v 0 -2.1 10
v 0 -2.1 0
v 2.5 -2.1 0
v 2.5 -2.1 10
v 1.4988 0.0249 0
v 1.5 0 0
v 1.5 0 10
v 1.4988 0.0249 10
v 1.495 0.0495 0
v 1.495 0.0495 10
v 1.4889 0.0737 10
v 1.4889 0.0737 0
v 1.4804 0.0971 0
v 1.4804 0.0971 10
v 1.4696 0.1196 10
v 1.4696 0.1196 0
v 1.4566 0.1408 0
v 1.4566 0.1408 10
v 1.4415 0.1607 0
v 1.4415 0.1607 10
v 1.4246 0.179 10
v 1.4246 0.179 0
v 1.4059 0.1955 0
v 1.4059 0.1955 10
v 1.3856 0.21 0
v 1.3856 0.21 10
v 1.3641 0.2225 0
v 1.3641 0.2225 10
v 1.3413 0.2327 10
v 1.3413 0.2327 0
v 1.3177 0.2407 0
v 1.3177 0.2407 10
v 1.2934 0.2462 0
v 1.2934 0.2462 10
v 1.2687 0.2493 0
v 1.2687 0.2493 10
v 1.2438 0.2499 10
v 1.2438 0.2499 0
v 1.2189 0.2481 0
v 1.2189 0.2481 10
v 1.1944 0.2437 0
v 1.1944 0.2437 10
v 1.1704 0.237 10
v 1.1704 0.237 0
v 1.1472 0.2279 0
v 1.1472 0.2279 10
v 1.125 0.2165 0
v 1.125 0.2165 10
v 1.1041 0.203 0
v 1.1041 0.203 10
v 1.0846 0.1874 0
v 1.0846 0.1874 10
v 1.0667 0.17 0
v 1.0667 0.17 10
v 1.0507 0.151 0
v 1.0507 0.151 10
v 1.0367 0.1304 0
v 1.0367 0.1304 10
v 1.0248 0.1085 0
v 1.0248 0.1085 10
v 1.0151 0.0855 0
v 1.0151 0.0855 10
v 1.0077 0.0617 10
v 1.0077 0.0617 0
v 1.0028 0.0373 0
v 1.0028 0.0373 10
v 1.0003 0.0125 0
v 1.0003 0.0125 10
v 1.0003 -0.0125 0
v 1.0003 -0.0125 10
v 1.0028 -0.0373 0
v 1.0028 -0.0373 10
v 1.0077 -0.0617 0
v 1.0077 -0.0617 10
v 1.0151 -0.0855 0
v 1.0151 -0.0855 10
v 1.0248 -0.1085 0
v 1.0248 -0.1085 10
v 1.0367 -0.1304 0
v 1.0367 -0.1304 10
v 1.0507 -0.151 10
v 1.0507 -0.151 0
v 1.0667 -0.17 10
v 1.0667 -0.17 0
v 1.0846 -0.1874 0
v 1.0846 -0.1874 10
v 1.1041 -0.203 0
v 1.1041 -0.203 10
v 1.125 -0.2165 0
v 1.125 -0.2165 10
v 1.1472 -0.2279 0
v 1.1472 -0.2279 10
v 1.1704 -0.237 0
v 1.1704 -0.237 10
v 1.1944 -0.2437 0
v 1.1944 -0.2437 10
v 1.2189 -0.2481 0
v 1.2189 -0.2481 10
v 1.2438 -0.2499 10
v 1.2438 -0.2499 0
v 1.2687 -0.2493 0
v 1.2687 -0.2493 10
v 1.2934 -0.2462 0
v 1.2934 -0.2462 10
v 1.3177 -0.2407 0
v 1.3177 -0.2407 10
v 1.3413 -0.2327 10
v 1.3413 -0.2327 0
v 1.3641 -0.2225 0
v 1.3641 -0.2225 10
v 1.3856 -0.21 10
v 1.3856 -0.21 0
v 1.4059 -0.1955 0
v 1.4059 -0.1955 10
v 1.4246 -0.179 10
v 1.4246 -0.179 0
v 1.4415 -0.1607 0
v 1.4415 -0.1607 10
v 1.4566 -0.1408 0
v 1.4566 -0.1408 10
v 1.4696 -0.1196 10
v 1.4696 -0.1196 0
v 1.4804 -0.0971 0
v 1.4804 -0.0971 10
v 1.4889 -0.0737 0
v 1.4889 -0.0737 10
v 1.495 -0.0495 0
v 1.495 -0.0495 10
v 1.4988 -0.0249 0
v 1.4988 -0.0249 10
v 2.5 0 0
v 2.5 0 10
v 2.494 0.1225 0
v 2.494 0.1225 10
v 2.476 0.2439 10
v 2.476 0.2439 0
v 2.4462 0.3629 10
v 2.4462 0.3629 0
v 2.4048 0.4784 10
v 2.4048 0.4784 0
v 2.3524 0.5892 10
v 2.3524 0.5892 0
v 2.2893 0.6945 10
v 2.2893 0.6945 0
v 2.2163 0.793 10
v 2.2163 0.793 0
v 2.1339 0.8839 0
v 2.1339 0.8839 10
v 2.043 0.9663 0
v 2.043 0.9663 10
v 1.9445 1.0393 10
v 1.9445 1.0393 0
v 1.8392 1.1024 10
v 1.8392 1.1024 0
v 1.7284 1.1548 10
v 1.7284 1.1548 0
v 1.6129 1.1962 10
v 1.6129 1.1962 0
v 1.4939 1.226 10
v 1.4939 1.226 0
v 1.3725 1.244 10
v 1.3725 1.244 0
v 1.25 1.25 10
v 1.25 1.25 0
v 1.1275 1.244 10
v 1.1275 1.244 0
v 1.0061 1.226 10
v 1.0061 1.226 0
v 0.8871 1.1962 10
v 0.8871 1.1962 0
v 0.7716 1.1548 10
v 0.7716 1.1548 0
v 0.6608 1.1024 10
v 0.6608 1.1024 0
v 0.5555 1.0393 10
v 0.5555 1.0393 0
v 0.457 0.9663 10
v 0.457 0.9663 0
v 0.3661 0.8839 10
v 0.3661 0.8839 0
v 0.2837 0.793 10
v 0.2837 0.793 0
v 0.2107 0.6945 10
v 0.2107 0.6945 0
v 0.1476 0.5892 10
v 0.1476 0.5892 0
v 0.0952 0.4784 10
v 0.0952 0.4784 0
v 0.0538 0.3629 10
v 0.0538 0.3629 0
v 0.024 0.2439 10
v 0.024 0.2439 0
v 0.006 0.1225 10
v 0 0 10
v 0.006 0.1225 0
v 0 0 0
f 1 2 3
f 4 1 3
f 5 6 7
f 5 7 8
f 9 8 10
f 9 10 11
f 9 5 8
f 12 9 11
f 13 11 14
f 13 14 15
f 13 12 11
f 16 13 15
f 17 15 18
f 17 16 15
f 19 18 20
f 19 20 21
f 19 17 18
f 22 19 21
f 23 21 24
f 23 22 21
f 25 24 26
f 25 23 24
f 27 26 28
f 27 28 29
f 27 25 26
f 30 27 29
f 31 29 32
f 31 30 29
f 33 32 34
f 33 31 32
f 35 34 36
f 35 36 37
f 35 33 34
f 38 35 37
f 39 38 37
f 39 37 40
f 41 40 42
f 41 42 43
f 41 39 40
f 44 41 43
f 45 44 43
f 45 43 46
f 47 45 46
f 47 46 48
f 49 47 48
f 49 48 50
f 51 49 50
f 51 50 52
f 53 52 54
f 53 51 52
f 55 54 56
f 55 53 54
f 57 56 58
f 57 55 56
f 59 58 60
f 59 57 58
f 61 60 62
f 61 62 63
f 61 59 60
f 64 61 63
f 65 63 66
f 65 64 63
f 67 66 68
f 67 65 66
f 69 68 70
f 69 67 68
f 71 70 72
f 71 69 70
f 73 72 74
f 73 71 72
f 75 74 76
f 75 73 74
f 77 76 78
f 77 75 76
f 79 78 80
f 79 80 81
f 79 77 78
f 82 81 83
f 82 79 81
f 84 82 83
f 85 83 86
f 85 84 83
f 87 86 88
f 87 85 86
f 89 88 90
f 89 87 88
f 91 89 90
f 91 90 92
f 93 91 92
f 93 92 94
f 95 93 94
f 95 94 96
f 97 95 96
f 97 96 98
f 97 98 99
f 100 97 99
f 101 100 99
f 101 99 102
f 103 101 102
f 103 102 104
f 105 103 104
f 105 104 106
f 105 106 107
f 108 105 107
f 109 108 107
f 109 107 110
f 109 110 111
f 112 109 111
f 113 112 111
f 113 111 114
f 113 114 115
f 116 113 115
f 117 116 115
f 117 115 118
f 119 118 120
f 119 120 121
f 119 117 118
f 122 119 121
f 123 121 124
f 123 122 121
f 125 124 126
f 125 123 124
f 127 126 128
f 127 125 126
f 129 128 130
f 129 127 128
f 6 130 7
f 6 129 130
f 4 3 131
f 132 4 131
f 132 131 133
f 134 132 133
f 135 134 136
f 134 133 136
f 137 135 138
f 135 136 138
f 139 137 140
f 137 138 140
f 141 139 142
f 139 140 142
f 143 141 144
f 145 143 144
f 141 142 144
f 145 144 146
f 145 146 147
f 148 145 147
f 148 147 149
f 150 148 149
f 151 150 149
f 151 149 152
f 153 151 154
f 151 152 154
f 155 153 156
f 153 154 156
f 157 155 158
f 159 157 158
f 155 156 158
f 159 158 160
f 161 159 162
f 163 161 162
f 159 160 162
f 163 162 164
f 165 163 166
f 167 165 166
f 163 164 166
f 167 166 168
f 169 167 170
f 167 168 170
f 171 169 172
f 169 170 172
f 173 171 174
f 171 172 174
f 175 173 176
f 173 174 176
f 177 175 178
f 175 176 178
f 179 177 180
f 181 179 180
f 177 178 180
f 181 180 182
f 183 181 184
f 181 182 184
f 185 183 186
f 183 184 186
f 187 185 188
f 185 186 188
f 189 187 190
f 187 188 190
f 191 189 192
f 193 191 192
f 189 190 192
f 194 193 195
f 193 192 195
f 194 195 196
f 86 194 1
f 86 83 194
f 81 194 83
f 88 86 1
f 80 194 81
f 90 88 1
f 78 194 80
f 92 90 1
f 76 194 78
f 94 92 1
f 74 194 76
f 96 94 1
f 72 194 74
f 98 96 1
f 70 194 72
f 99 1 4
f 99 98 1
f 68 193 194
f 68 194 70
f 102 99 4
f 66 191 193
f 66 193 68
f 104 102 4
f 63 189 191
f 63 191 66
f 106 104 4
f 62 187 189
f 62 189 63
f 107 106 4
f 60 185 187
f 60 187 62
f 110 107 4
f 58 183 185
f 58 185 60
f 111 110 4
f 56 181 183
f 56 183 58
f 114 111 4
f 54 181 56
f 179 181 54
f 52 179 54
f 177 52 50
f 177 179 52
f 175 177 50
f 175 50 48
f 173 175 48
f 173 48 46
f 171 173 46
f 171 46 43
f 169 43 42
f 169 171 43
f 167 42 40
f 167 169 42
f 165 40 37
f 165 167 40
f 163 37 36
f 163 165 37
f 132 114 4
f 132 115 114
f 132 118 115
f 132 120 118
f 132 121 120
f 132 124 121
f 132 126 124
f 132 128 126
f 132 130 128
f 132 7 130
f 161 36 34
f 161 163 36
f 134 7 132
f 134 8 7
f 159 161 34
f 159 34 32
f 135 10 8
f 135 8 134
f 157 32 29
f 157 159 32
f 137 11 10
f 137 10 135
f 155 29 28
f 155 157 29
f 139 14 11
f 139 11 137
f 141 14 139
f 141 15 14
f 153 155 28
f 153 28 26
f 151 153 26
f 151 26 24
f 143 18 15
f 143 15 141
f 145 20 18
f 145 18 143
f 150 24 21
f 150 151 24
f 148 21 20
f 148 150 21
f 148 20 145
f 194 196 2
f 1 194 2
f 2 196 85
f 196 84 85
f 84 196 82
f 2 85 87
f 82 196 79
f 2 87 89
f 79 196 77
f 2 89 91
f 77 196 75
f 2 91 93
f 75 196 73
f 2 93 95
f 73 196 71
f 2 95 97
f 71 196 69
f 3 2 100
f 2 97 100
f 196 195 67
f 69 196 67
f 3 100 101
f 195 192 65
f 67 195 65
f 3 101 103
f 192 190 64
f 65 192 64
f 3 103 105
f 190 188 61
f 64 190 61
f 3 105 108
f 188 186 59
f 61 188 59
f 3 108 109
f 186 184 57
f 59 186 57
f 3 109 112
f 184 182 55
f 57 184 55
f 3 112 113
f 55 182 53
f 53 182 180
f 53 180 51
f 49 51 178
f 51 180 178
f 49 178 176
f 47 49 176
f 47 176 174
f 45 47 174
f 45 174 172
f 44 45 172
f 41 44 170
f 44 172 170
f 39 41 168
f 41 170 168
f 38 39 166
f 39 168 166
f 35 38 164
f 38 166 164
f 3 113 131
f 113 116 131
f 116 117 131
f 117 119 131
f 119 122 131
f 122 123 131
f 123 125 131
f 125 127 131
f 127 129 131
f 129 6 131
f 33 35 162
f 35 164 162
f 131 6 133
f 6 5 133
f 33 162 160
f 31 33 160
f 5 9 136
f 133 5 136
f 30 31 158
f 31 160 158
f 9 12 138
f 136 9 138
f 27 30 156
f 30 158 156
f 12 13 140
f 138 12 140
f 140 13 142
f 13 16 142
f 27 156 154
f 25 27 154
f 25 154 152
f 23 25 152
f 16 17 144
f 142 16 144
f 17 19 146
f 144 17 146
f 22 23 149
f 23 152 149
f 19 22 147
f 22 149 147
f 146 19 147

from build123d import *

# Parameters (mm, degrees)
SKETCH_R  = 0.25
PAD_DEPTH = 10


with BuildPart() as part:
    # Sketch → Pad (new body)
    with BuildSketch(Plane.XY):
        with BuildLine():
            Line((0, 0), (0, -2.1))
            Line((0, -2.1), (2.5, -2.1))
            Line((2.5, -2.1), (2.5, 0))
            ThreePointArc((2.5, 0), (1.25, 1.25), (0, 0))
        make_face()
        with Locations((1.25, 0)):
            Circle(SKETCH_R, mode=Mode.SUBTRACT)
    extrude(amount=PAD_DEPTH)


solid = part.part
